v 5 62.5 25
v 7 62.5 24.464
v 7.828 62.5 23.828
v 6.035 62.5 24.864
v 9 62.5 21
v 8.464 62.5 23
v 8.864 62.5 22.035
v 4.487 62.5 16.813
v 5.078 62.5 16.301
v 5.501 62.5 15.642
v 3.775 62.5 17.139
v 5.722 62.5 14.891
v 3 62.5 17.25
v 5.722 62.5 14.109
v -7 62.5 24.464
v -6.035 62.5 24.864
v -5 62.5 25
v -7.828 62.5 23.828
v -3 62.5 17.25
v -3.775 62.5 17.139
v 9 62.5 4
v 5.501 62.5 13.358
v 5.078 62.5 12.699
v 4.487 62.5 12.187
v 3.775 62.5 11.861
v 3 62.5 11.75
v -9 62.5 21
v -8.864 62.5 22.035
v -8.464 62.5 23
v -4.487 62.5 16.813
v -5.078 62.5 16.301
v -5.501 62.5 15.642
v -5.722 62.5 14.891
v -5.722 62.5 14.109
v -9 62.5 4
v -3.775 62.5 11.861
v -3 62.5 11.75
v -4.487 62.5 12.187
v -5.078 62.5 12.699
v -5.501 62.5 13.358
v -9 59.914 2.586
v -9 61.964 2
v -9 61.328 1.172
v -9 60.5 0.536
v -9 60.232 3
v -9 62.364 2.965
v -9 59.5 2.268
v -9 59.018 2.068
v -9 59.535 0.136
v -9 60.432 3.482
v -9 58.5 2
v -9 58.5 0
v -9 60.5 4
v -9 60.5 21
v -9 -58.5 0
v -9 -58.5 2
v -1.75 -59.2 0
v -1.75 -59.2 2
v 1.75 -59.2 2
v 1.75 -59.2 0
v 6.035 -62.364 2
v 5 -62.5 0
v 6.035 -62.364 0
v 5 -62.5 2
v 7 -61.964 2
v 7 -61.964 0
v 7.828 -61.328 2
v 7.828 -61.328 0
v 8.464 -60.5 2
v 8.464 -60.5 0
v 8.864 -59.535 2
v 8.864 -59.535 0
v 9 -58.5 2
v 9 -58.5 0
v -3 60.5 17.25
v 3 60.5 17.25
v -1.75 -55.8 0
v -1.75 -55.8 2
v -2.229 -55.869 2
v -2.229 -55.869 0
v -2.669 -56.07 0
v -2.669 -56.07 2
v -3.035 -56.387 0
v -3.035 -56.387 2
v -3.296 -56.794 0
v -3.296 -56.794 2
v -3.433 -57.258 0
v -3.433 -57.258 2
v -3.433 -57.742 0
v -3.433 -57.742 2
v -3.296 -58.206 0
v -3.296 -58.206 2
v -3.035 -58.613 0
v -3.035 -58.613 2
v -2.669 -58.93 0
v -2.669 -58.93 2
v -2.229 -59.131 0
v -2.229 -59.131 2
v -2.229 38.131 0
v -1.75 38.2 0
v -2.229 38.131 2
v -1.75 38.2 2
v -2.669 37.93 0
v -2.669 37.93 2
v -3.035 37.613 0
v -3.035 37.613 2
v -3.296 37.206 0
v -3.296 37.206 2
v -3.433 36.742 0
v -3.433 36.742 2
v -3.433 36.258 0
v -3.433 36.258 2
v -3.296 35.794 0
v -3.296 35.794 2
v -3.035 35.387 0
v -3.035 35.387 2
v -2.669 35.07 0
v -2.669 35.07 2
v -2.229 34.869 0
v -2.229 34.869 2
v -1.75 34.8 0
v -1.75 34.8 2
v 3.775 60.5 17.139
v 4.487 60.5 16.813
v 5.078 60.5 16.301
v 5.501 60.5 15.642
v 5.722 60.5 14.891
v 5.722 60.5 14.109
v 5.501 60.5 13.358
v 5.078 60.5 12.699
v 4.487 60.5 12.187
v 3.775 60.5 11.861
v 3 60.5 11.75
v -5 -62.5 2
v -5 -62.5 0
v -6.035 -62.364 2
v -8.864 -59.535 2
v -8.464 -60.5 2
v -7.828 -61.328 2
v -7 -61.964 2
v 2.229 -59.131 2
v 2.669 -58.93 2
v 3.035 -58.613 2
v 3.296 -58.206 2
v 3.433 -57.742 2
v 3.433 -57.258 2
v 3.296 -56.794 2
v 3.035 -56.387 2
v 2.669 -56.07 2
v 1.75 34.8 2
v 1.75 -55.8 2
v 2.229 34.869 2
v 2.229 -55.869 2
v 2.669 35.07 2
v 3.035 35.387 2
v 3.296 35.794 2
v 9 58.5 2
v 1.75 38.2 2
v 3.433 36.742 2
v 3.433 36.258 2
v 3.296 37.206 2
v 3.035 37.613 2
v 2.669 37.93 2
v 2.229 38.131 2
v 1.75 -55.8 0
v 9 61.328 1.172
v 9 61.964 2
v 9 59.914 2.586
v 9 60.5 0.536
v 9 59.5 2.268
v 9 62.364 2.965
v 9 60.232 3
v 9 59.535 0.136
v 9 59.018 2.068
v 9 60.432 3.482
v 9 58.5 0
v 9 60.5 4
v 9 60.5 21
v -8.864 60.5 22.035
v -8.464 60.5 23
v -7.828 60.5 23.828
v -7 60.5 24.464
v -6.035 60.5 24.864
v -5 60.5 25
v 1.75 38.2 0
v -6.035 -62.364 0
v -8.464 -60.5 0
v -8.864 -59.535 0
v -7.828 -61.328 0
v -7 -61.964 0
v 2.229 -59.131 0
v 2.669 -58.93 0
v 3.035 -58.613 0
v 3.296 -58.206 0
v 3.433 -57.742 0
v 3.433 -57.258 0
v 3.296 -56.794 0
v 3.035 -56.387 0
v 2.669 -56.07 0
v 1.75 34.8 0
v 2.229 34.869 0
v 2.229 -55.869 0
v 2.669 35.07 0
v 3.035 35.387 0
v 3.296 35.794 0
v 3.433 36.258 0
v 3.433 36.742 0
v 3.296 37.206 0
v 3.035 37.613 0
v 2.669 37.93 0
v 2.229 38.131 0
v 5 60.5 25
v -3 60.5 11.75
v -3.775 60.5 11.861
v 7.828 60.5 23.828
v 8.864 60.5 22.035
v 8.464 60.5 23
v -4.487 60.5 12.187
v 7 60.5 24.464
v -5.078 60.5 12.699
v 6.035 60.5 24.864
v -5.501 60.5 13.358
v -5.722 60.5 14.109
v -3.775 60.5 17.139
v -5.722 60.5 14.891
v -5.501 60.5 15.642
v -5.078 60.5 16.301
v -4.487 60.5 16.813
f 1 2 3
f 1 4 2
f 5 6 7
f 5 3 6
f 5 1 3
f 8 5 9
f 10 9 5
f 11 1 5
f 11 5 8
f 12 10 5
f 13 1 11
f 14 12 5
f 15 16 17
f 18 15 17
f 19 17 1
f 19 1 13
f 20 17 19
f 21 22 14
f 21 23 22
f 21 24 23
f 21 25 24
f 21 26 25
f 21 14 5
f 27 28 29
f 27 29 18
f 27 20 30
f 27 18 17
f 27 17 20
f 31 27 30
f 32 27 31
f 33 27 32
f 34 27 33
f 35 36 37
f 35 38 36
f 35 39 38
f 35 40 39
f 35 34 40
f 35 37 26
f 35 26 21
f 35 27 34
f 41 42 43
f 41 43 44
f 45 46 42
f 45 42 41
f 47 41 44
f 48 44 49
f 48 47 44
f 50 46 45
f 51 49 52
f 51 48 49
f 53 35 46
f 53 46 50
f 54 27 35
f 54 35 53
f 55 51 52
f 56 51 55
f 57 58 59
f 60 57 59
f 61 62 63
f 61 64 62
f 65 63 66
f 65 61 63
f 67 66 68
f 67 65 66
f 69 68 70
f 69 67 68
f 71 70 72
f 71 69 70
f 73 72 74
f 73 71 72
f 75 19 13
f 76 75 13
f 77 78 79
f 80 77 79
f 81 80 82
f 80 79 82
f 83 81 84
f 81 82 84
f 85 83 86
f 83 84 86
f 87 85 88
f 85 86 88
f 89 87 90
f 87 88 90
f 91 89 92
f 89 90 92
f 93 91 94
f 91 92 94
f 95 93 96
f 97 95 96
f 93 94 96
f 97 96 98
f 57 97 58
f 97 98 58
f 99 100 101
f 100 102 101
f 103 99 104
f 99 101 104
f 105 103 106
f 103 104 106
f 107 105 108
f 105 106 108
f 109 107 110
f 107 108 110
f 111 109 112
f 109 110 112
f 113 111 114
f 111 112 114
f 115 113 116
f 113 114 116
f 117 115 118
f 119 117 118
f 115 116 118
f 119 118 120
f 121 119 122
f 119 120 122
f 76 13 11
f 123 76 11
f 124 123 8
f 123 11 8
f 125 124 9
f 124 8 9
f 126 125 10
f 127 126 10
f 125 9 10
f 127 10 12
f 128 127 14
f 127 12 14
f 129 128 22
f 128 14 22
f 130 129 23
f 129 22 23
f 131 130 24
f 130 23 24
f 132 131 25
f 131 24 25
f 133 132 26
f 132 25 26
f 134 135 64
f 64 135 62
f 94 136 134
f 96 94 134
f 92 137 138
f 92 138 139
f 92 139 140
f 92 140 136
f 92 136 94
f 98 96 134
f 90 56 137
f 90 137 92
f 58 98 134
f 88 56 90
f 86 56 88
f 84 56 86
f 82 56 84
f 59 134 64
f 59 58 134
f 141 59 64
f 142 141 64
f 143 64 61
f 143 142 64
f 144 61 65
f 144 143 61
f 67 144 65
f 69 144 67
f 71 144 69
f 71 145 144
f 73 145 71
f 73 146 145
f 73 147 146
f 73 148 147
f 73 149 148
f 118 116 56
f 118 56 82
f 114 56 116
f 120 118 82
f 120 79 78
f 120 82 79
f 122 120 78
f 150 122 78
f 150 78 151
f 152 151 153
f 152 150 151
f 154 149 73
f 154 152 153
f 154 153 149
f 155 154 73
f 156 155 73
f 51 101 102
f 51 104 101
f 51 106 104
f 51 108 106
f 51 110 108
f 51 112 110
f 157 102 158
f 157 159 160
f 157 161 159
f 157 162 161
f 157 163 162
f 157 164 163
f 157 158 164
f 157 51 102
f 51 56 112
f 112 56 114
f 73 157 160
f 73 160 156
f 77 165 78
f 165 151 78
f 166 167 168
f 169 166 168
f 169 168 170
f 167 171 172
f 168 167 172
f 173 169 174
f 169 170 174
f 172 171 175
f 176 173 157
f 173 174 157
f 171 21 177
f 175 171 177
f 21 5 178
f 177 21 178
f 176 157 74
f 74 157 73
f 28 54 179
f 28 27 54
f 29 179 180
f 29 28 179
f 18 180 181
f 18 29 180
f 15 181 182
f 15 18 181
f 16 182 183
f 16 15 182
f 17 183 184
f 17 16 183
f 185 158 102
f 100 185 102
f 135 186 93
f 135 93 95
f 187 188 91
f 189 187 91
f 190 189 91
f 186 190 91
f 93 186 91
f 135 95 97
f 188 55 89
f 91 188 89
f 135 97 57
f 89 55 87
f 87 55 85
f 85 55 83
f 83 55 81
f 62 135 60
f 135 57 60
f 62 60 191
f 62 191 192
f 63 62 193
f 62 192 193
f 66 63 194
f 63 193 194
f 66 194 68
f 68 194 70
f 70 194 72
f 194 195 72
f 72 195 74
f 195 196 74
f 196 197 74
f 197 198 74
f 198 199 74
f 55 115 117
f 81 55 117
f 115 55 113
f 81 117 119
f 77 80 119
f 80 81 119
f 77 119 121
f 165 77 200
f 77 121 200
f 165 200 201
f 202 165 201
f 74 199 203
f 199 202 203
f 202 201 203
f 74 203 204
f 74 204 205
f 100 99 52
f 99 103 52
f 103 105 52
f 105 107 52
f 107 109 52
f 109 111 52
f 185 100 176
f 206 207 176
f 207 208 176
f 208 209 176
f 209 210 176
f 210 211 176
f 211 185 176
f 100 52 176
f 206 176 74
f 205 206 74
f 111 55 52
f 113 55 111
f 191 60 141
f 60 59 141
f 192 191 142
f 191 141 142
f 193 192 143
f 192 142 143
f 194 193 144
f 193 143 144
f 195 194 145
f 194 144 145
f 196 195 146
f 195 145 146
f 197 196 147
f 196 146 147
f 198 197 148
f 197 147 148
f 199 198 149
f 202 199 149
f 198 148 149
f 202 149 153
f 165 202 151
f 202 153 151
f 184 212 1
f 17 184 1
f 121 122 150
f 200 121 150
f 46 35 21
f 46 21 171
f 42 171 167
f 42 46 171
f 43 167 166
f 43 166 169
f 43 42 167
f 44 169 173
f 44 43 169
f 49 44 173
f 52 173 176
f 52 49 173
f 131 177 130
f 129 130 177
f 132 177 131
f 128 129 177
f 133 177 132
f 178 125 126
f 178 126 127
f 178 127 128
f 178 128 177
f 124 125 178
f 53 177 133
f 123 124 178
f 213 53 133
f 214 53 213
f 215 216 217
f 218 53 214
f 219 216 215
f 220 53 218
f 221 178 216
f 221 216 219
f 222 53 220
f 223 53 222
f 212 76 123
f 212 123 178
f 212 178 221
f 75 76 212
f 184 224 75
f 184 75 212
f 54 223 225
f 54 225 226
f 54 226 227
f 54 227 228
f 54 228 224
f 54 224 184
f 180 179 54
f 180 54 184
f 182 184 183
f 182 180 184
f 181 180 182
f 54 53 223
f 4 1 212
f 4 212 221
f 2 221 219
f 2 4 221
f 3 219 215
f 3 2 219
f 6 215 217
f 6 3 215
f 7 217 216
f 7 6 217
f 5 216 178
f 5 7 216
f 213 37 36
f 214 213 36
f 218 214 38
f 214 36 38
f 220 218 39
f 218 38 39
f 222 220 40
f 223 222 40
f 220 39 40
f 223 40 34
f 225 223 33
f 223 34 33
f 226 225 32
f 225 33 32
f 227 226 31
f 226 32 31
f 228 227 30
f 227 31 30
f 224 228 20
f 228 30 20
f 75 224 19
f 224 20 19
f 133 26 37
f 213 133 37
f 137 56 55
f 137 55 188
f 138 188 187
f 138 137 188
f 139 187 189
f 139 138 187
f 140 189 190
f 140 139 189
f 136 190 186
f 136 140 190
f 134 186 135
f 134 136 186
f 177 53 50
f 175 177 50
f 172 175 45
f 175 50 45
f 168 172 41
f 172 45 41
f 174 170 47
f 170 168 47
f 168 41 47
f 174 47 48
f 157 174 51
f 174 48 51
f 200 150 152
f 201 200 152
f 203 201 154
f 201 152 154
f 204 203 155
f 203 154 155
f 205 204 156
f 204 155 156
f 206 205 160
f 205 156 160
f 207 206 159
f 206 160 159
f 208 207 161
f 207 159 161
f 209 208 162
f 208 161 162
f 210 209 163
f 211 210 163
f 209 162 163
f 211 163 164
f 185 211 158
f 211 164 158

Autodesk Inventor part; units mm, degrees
ref_plane "YZ Plane" through (0, 0, 0) normal (1, 0, 0) x (0, 1, 0)
ref_plane "XZ Plane" through (0, 0, 0) normal (0, 1, 0) x (-1, 0, 0)
ref_plane "XY Plane" through (0, 0, 0) normal (0, 0, 1) x (1, 0, 0)
sketch "Sketch1" plane through (0, 0, 0) normal (0, 0, 1) x (1, 0, 0)
  line L0 (-9, -62.5) -> (9, -62.5)
  line L1 (9, -62.5) -> (9, 62.5)
  line L2 (9, 62.5) -> (-9, 62.5)
  line L3 (-9, 62.5) -> (-9, -62.5)
  line L4 (-9, -62.5) -> (9, 62.5) construction
  line L5 (9, -62.5) -> (-9, 62.5) construction
  point P0 (0, 0)
  dimension "d0" = 18
  dimension "d1" = 125
extrude "Plate1" add sketch "Sketch1" along normal blind 2
sketch "Sketch2" plane through (-9, 60.5, 0) normal (0, 1, 0) x (-1, 0, 0)
  line L0 (-18, 0) -> (0, 0)
  line L1 (0, 0) -> (0, 25)
  line L2 (0, 25) -> (-18, 25)
  line L3 (-18, 25) -> (-18, 0)
edge flange "Flange1" height 25 angle 90 thickness 2 bend radius 2 thickness toward (0, 1, 0) relief tear relief width 2 relief depth 1 edges at (0, 62.5, 2) wall of the first edge with corners at (9, 60.5, 0) (-9, 60.5, 0) (-9, 60.5, 25) (9, 60.5, 25)
bend "Bend1"
corner "Corner1"
sketch "Sketch3" plane through (0, 0, 2) normal (0, 0, 1) x (1, 0, 0)
  line L0 (-1.75, -57.5) -> (1.75, -57.5) construction
  line L1 (-1.75, -59.2) -> (1.75, -59.2)
  line L2 (1.75, -55.8) -> (-1.75, -55.8)
  arc A0 (-1.75, -55.8) -> (-1.75, -59.2) centre (-1.75, -57.5) ccw
  arc A1 (1.75, -59.2) -> (1.75, -55.8) centre (1.75, -57.5) ccw
  line L3 (-1.75, 36.5) -> (1.75, 36.5) construction
  line L4 (-9, -62.5) -> (-9, 58.5) projected
  line L5 (-1.75, 34.8) -> (1.75, 34.8)
  line L6 (1.75, 38.2) -> (-1.75, 38.2)
  arc A2 (-1.75, 38.2) -> (-1.75, 34.8) centre (-1.75, 36.5) ccw
  arc A3 (1.75, 34.8) -> (1.75, 38.2) centre (1.75, 36.5) ccw
  line L7 (9, -62.5) -> (-9, -62.5) projected
  point P0 (0, 0)
  point P1 (0, -57.5)
  point P2 (0, 36.5)
  dimension "d13" = 94
  dimension "d14" = 5
  dimension "d15" = 3.4
  dimension "d16" = 3.5
extrude "Cut1" cut sketch "Sketch3" against normal blind 2
sketch "Sketch4" plane through (-9, 62.5, 25) normal (0, 1, 0) x (1, 0, 0)
  line L0 (12, 10.5) -> (6, 10.5) construction
  line L1 (12, 13.25) -> (6, 13.25)
  line L2 (6, 7.75) -> (12, 7.75)
  arc A0 (12, 7.75) -> (12, 13.25) centre (12, 10.5) ccw
  arc A1 (6, 13.25) -> (6, 7.75) centre (6, 10.5) ccw
  line L3 (18, 21) -> (18, 0) projected
  point P0 (9, 25)
  point P1 (9, 10.5)
  point P2 (18, 10.5)
  dimension "d19" = 5.5
  dimension "d20" = 6
extrude "Cut2" cut sketch "Sketch4" against normal blind 2
fillet "Fillet1" radius 4 4 edges at (-9, 61.5, 25) (9, 61.5, 25) (-9, -62.5, 1) (9, -62.5, 1)
equation "\"d17\" = Thickness"
equation "\"d21\" = Thickness"
equation "\"d2\" = Thickness"
equation "\"d3\" = BendReliefWidth"
equation "\"d4\" = BendReliefDepth"
equation "\"d5\" = MinimumRemnant"
equation "\"d6\" = TransitionRadius"
equation "\"d9\" = BendRadius"
equation "\"d10\" = CornerReliefSize"
equation "\"d11\" = GapSize"
equation "\"d12\" = JacobiRadiusSize"
equation "\"BendRadius\" = Thickness"
equation "\"BendReliefWidth\" = Thickness"
equation "\"BendReliefDepth\" = 0.5 * Thickness"
equation "\"CornerReliefSize\" = 4 * Thickness"
equation "\"MinimumRemnant\" = 2 * Thickness"
equation "\"TransitionRadius\" = BendRadius"
equation "\"JacobiRadiusSize\" = BendRadius"
equation "\"GapSize\" = Thickness"
equation "\"Thickness\" = 2"
properties part number "BREEZE-M30"
